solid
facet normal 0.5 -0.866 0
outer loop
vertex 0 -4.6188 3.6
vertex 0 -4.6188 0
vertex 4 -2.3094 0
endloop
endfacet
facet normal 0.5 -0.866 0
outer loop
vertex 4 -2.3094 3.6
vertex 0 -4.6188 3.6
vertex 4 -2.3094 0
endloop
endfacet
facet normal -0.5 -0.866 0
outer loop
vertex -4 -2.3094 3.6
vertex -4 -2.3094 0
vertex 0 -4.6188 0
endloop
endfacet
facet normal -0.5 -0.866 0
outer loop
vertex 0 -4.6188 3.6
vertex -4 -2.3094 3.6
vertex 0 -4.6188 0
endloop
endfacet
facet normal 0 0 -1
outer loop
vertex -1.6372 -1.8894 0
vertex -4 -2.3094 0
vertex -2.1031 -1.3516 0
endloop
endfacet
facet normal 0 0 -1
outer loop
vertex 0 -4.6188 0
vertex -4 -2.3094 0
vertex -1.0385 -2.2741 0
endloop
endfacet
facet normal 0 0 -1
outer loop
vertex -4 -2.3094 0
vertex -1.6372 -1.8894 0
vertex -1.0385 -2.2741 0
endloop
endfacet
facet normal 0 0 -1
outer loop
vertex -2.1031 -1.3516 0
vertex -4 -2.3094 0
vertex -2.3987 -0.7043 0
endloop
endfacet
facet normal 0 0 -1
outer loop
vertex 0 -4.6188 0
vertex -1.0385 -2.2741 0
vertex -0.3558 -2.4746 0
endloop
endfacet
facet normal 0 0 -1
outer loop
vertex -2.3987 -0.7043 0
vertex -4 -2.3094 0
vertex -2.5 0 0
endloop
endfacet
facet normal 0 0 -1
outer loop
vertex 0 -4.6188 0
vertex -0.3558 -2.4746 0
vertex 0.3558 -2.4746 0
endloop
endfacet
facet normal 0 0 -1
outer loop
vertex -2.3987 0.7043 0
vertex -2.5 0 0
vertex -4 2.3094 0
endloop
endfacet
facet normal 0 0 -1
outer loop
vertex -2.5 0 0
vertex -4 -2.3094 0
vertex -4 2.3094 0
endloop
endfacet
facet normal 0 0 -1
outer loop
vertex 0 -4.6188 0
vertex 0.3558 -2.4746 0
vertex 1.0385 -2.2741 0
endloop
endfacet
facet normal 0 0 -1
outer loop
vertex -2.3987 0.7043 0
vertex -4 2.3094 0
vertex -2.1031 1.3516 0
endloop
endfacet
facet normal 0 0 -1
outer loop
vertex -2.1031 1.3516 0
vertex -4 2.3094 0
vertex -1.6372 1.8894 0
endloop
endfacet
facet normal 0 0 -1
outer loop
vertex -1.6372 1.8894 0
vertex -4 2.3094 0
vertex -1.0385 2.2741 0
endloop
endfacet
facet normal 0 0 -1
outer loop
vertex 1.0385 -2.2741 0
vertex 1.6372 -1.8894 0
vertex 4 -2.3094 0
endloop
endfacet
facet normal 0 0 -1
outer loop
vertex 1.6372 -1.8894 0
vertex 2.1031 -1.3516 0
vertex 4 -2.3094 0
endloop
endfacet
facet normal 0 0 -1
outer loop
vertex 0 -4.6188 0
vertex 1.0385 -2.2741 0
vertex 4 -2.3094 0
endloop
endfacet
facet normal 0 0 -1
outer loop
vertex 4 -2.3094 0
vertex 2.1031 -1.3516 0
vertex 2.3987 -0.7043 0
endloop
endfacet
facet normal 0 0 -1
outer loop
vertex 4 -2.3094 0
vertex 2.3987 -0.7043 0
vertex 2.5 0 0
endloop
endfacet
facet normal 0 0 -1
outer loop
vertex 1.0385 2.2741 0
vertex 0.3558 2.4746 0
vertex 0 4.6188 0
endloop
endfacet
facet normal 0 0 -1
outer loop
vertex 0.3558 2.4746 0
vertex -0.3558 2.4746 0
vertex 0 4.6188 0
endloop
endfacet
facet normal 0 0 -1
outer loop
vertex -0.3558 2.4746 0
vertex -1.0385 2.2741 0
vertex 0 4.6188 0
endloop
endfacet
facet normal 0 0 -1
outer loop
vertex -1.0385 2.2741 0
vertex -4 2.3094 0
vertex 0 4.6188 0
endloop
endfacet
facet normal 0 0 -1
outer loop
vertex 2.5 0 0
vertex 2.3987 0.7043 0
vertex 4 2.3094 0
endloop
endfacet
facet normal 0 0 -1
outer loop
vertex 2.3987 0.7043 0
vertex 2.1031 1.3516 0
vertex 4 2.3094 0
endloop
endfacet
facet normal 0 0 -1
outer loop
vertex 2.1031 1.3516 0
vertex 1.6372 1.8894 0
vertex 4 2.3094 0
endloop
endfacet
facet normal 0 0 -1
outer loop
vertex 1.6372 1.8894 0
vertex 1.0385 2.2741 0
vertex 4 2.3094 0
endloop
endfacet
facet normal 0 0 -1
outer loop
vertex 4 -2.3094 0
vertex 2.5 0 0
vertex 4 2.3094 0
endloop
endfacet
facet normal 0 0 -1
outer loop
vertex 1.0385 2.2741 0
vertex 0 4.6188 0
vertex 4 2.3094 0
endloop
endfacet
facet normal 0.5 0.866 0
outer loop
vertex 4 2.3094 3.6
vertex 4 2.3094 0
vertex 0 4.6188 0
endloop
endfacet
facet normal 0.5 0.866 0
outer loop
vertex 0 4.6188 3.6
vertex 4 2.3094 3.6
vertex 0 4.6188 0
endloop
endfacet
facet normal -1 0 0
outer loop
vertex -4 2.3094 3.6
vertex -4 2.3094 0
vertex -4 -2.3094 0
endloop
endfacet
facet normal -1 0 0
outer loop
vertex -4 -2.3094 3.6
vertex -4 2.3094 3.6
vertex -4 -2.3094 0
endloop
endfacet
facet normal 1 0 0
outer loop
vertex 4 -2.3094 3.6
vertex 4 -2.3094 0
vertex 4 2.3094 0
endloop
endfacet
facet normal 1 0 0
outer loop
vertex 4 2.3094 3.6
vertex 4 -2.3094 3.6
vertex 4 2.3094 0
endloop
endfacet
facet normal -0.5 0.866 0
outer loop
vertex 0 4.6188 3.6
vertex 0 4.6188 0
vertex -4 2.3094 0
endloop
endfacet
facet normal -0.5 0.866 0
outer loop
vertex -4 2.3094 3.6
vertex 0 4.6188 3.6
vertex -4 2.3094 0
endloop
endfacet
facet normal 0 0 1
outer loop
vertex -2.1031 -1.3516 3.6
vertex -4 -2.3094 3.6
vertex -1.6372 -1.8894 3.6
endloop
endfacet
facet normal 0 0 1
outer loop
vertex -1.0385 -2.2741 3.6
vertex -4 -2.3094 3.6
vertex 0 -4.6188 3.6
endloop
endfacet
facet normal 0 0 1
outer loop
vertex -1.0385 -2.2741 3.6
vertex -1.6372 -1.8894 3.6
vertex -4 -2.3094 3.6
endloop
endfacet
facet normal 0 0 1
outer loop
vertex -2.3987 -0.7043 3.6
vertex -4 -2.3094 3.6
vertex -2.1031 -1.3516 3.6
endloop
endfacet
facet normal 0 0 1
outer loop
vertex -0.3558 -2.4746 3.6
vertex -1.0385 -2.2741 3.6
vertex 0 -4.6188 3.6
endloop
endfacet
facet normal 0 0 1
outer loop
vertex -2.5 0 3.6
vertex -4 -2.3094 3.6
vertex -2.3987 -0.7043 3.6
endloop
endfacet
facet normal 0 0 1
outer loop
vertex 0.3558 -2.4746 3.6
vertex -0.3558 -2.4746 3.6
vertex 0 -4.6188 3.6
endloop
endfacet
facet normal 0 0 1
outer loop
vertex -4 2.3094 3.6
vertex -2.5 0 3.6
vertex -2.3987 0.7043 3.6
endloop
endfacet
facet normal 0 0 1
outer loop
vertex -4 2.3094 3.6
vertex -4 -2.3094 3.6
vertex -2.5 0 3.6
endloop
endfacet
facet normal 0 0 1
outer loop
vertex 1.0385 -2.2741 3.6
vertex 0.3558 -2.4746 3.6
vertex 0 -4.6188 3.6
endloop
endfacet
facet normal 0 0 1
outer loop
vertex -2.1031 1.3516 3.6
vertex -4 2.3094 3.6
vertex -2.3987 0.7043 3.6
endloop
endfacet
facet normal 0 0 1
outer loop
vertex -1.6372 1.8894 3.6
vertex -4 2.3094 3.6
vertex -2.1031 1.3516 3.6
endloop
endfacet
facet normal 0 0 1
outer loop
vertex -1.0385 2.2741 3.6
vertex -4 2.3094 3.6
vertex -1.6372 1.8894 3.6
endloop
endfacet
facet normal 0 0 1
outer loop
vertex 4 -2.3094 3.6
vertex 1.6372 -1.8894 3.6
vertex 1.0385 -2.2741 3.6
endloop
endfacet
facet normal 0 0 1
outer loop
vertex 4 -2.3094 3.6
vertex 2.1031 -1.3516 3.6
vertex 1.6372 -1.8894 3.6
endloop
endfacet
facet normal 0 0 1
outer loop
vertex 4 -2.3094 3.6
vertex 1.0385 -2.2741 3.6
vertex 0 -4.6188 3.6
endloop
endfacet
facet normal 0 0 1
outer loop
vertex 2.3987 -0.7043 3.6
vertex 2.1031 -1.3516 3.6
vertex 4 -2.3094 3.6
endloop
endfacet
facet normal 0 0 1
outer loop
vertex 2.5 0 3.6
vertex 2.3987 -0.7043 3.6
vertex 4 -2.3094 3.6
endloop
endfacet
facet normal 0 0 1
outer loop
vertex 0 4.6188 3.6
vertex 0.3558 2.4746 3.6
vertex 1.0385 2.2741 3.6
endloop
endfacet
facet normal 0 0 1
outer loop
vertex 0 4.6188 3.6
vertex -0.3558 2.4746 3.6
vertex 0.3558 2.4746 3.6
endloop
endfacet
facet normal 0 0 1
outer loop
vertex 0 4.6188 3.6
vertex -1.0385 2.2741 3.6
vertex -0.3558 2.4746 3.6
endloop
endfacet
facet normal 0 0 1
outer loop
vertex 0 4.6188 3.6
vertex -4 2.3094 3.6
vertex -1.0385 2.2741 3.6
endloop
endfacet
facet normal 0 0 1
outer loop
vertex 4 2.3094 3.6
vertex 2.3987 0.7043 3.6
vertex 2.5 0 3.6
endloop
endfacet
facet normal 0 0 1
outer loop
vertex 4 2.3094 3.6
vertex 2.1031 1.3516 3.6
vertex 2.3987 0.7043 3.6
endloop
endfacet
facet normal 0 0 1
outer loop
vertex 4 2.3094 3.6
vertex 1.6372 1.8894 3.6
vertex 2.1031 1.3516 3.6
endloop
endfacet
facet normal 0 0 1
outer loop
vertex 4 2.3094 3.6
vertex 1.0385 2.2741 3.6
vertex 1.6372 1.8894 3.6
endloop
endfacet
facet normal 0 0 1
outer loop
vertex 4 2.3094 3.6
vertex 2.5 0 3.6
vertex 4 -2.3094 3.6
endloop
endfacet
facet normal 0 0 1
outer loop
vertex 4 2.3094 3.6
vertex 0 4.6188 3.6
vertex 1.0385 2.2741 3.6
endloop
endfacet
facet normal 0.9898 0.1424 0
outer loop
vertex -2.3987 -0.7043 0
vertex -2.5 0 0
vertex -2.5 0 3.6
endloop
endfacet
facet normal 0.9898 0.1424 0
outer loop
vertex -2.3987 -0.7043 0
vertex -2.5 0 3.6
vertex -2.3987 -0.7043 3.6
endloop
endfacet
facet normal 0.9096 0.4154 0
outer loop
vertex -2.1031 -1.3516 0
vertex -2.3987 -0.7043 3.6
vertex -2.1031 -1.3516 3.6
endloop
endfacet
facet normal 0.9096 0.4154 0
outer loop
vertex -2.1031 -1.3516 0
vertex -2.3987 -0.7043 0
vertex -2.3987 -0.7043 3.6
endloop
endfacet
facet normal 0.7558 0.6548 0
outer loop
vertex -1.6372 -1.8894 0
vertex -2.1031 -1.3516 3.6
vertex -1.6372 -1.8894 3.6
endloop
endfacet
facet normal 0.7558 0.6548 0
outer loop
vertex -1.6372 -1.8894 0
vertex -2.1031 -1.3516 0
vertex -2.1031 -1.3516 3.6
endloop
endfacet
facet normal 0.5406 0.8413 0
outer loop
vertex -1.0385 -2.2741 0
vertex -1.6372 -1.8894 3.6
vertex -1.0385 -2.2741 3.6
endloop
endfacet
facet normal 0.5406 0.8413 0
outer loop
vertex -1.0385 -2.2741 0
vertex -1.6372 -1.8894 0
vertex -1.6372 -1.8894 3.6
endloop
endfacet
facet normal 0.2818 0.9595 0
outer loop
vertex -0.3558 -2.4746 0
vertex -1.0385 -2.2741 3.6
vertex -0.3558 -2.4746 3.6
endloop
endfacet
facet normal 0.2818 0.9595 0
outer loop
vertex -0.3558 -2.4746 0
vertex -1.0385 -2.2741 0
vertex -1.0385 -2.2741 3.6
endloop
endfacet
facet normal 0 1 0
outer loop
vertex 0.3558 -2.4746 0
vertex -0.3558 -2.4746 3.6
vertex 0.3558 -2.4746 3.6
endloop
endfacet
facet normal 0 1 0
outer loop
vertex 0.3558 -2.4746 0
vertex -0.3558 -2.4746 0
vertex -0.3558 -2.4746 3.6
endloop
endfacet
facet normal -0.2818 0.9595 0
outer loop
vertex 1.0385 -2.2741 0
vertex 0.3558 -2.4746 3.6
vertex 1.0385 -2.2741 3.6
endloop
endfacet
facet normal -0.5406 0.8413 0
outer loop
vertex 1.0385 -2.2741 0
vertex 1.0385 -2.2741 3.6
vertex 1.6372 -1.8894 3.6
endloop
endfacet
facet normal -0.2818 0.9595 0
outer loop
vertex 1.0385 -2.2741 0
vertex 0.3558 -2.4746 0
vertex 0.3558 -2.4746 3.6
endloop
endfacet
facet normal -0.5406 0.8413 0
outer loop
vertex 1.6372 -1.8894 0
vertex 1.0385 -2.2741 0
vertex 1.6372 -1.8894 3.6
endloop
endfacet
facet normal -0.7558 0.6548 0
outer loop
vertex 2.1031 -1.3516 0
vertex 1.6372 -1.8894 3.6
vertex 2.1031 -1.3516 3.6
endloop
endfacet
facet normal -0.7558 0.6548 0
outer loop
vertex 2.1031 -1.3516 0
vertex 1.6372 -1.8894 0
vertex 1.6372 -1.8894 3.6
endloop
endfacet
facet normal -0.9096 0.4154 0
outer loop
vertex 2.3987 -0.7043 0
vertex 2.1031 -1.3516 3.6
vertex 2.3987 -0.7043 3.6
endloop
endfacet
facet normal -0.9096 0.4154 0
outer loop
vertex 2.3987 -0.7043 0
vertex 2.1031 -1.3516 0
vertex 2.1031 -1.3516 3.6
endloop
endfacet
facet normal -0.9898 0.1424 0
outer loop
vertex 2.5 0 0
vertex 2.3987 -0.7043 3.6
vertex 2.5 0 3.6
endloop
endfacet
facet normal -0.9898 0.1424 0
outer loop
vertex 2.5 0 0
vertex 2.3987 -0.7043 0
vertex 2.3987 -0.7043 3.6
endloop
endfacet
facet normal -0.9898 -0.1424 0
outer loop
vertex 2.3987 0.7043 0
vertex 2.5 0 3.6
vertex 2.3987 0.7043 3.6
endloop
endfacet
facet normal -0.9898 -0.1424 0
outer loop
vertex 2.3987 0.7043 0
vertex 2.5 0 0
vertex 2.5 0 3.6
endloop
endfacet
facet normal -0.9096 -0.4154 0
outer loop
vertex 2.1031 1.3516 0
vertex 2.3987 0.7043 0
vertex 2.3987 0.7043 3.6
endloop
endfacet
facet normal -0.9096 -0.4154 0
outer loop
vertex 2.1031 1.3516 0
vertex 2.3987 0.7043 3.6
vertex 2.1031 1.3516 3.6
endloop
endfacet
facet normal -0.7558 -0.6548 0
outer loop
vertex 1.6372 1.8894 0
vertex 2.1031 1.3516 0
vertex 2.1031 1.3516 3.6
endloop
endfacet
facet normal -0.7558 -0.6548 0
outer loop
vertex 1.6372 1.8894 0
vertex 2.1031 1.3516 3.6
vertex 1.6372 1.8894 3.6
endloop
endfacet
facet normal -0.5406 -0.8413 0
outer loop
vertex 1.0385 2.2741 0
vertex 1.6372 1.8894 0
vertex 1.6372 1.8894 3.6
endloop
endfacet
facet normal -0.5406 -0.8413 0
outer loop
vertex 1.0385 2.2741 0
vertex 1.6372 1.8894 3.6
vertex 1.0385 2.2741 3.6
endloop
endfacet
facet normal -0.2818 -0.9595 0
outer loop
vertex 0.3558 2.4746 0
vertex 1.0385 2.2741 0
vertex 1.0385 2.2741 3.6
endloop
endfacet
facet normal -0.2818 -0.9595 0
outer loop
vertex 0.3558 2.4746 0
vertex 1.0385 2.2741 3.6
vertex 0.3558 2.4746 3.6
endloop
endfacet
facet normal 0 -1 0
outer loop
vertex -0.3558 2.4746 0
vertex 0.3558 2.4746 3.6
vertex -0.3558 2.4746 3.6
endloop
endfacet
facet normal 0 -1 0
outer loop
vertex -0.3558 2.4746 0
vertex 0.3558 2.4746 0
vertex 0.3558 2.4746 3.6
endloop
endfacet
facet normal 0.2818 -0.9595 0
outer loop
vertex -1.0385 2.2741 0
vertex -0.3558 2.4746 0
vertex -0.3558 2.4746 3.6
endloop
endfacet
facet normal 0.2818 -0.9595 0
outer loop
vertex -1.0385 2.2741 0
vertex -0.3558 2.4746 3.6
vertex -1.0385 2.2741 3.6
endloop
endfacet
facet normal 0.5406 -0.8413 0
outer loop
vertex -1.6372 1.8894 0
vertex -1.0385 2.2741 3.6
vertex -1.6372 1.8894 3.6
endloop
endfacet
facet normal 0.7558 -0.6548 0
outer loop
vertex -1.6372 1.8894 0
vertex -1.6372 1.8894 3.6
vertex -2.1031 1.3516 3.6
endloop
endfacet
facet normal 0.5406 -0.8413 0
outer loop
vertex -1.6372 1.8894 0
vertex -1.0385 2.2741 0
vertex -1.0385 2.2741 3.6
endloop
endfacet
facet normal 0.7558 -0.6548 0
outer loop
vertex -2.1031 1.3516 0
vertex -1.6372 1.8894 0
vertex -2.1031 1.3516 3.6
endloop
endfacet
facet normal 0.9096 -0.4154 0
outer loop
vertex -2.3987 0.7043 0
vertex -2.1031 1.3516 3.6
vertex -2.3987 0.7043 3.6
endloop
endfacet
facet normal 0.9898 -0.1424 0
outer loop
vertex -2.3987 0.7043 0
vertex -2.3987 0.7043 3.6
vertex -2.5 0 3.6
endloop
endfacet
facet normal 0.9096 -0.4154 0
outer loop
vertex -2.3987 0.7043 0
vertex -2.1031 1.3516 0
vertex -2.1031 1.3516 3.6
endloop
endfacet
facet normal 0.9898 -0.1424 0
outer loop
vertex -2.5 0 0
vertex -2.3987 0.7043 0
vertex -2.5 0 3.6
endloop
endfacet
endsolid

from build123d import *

# Parameters (mm, degrees)
SKETCH_1_R      = 2.5
EXTRUDE_1_DEPTH = 3.6


with BuildPart() as part:
    # Эскиз1 → Вытянуть1 (new body)
    with BuildSketch(Plane.XY):
        Polygon((0, 4.618802154), (-4, 2.309401077), (-4, -2.309401077), (0, -4.618802154), (4, -2.309401077), (4, 2.309401077), align=None)
        with Locations(Location((0, 0, 0), (0, 0, 180))):
            Circle(SKETCH_1_R, mode=Mode.SUBTRACT)
    extrude(amount=EXTRUDE_1_DEPTH)


solid = part.part
